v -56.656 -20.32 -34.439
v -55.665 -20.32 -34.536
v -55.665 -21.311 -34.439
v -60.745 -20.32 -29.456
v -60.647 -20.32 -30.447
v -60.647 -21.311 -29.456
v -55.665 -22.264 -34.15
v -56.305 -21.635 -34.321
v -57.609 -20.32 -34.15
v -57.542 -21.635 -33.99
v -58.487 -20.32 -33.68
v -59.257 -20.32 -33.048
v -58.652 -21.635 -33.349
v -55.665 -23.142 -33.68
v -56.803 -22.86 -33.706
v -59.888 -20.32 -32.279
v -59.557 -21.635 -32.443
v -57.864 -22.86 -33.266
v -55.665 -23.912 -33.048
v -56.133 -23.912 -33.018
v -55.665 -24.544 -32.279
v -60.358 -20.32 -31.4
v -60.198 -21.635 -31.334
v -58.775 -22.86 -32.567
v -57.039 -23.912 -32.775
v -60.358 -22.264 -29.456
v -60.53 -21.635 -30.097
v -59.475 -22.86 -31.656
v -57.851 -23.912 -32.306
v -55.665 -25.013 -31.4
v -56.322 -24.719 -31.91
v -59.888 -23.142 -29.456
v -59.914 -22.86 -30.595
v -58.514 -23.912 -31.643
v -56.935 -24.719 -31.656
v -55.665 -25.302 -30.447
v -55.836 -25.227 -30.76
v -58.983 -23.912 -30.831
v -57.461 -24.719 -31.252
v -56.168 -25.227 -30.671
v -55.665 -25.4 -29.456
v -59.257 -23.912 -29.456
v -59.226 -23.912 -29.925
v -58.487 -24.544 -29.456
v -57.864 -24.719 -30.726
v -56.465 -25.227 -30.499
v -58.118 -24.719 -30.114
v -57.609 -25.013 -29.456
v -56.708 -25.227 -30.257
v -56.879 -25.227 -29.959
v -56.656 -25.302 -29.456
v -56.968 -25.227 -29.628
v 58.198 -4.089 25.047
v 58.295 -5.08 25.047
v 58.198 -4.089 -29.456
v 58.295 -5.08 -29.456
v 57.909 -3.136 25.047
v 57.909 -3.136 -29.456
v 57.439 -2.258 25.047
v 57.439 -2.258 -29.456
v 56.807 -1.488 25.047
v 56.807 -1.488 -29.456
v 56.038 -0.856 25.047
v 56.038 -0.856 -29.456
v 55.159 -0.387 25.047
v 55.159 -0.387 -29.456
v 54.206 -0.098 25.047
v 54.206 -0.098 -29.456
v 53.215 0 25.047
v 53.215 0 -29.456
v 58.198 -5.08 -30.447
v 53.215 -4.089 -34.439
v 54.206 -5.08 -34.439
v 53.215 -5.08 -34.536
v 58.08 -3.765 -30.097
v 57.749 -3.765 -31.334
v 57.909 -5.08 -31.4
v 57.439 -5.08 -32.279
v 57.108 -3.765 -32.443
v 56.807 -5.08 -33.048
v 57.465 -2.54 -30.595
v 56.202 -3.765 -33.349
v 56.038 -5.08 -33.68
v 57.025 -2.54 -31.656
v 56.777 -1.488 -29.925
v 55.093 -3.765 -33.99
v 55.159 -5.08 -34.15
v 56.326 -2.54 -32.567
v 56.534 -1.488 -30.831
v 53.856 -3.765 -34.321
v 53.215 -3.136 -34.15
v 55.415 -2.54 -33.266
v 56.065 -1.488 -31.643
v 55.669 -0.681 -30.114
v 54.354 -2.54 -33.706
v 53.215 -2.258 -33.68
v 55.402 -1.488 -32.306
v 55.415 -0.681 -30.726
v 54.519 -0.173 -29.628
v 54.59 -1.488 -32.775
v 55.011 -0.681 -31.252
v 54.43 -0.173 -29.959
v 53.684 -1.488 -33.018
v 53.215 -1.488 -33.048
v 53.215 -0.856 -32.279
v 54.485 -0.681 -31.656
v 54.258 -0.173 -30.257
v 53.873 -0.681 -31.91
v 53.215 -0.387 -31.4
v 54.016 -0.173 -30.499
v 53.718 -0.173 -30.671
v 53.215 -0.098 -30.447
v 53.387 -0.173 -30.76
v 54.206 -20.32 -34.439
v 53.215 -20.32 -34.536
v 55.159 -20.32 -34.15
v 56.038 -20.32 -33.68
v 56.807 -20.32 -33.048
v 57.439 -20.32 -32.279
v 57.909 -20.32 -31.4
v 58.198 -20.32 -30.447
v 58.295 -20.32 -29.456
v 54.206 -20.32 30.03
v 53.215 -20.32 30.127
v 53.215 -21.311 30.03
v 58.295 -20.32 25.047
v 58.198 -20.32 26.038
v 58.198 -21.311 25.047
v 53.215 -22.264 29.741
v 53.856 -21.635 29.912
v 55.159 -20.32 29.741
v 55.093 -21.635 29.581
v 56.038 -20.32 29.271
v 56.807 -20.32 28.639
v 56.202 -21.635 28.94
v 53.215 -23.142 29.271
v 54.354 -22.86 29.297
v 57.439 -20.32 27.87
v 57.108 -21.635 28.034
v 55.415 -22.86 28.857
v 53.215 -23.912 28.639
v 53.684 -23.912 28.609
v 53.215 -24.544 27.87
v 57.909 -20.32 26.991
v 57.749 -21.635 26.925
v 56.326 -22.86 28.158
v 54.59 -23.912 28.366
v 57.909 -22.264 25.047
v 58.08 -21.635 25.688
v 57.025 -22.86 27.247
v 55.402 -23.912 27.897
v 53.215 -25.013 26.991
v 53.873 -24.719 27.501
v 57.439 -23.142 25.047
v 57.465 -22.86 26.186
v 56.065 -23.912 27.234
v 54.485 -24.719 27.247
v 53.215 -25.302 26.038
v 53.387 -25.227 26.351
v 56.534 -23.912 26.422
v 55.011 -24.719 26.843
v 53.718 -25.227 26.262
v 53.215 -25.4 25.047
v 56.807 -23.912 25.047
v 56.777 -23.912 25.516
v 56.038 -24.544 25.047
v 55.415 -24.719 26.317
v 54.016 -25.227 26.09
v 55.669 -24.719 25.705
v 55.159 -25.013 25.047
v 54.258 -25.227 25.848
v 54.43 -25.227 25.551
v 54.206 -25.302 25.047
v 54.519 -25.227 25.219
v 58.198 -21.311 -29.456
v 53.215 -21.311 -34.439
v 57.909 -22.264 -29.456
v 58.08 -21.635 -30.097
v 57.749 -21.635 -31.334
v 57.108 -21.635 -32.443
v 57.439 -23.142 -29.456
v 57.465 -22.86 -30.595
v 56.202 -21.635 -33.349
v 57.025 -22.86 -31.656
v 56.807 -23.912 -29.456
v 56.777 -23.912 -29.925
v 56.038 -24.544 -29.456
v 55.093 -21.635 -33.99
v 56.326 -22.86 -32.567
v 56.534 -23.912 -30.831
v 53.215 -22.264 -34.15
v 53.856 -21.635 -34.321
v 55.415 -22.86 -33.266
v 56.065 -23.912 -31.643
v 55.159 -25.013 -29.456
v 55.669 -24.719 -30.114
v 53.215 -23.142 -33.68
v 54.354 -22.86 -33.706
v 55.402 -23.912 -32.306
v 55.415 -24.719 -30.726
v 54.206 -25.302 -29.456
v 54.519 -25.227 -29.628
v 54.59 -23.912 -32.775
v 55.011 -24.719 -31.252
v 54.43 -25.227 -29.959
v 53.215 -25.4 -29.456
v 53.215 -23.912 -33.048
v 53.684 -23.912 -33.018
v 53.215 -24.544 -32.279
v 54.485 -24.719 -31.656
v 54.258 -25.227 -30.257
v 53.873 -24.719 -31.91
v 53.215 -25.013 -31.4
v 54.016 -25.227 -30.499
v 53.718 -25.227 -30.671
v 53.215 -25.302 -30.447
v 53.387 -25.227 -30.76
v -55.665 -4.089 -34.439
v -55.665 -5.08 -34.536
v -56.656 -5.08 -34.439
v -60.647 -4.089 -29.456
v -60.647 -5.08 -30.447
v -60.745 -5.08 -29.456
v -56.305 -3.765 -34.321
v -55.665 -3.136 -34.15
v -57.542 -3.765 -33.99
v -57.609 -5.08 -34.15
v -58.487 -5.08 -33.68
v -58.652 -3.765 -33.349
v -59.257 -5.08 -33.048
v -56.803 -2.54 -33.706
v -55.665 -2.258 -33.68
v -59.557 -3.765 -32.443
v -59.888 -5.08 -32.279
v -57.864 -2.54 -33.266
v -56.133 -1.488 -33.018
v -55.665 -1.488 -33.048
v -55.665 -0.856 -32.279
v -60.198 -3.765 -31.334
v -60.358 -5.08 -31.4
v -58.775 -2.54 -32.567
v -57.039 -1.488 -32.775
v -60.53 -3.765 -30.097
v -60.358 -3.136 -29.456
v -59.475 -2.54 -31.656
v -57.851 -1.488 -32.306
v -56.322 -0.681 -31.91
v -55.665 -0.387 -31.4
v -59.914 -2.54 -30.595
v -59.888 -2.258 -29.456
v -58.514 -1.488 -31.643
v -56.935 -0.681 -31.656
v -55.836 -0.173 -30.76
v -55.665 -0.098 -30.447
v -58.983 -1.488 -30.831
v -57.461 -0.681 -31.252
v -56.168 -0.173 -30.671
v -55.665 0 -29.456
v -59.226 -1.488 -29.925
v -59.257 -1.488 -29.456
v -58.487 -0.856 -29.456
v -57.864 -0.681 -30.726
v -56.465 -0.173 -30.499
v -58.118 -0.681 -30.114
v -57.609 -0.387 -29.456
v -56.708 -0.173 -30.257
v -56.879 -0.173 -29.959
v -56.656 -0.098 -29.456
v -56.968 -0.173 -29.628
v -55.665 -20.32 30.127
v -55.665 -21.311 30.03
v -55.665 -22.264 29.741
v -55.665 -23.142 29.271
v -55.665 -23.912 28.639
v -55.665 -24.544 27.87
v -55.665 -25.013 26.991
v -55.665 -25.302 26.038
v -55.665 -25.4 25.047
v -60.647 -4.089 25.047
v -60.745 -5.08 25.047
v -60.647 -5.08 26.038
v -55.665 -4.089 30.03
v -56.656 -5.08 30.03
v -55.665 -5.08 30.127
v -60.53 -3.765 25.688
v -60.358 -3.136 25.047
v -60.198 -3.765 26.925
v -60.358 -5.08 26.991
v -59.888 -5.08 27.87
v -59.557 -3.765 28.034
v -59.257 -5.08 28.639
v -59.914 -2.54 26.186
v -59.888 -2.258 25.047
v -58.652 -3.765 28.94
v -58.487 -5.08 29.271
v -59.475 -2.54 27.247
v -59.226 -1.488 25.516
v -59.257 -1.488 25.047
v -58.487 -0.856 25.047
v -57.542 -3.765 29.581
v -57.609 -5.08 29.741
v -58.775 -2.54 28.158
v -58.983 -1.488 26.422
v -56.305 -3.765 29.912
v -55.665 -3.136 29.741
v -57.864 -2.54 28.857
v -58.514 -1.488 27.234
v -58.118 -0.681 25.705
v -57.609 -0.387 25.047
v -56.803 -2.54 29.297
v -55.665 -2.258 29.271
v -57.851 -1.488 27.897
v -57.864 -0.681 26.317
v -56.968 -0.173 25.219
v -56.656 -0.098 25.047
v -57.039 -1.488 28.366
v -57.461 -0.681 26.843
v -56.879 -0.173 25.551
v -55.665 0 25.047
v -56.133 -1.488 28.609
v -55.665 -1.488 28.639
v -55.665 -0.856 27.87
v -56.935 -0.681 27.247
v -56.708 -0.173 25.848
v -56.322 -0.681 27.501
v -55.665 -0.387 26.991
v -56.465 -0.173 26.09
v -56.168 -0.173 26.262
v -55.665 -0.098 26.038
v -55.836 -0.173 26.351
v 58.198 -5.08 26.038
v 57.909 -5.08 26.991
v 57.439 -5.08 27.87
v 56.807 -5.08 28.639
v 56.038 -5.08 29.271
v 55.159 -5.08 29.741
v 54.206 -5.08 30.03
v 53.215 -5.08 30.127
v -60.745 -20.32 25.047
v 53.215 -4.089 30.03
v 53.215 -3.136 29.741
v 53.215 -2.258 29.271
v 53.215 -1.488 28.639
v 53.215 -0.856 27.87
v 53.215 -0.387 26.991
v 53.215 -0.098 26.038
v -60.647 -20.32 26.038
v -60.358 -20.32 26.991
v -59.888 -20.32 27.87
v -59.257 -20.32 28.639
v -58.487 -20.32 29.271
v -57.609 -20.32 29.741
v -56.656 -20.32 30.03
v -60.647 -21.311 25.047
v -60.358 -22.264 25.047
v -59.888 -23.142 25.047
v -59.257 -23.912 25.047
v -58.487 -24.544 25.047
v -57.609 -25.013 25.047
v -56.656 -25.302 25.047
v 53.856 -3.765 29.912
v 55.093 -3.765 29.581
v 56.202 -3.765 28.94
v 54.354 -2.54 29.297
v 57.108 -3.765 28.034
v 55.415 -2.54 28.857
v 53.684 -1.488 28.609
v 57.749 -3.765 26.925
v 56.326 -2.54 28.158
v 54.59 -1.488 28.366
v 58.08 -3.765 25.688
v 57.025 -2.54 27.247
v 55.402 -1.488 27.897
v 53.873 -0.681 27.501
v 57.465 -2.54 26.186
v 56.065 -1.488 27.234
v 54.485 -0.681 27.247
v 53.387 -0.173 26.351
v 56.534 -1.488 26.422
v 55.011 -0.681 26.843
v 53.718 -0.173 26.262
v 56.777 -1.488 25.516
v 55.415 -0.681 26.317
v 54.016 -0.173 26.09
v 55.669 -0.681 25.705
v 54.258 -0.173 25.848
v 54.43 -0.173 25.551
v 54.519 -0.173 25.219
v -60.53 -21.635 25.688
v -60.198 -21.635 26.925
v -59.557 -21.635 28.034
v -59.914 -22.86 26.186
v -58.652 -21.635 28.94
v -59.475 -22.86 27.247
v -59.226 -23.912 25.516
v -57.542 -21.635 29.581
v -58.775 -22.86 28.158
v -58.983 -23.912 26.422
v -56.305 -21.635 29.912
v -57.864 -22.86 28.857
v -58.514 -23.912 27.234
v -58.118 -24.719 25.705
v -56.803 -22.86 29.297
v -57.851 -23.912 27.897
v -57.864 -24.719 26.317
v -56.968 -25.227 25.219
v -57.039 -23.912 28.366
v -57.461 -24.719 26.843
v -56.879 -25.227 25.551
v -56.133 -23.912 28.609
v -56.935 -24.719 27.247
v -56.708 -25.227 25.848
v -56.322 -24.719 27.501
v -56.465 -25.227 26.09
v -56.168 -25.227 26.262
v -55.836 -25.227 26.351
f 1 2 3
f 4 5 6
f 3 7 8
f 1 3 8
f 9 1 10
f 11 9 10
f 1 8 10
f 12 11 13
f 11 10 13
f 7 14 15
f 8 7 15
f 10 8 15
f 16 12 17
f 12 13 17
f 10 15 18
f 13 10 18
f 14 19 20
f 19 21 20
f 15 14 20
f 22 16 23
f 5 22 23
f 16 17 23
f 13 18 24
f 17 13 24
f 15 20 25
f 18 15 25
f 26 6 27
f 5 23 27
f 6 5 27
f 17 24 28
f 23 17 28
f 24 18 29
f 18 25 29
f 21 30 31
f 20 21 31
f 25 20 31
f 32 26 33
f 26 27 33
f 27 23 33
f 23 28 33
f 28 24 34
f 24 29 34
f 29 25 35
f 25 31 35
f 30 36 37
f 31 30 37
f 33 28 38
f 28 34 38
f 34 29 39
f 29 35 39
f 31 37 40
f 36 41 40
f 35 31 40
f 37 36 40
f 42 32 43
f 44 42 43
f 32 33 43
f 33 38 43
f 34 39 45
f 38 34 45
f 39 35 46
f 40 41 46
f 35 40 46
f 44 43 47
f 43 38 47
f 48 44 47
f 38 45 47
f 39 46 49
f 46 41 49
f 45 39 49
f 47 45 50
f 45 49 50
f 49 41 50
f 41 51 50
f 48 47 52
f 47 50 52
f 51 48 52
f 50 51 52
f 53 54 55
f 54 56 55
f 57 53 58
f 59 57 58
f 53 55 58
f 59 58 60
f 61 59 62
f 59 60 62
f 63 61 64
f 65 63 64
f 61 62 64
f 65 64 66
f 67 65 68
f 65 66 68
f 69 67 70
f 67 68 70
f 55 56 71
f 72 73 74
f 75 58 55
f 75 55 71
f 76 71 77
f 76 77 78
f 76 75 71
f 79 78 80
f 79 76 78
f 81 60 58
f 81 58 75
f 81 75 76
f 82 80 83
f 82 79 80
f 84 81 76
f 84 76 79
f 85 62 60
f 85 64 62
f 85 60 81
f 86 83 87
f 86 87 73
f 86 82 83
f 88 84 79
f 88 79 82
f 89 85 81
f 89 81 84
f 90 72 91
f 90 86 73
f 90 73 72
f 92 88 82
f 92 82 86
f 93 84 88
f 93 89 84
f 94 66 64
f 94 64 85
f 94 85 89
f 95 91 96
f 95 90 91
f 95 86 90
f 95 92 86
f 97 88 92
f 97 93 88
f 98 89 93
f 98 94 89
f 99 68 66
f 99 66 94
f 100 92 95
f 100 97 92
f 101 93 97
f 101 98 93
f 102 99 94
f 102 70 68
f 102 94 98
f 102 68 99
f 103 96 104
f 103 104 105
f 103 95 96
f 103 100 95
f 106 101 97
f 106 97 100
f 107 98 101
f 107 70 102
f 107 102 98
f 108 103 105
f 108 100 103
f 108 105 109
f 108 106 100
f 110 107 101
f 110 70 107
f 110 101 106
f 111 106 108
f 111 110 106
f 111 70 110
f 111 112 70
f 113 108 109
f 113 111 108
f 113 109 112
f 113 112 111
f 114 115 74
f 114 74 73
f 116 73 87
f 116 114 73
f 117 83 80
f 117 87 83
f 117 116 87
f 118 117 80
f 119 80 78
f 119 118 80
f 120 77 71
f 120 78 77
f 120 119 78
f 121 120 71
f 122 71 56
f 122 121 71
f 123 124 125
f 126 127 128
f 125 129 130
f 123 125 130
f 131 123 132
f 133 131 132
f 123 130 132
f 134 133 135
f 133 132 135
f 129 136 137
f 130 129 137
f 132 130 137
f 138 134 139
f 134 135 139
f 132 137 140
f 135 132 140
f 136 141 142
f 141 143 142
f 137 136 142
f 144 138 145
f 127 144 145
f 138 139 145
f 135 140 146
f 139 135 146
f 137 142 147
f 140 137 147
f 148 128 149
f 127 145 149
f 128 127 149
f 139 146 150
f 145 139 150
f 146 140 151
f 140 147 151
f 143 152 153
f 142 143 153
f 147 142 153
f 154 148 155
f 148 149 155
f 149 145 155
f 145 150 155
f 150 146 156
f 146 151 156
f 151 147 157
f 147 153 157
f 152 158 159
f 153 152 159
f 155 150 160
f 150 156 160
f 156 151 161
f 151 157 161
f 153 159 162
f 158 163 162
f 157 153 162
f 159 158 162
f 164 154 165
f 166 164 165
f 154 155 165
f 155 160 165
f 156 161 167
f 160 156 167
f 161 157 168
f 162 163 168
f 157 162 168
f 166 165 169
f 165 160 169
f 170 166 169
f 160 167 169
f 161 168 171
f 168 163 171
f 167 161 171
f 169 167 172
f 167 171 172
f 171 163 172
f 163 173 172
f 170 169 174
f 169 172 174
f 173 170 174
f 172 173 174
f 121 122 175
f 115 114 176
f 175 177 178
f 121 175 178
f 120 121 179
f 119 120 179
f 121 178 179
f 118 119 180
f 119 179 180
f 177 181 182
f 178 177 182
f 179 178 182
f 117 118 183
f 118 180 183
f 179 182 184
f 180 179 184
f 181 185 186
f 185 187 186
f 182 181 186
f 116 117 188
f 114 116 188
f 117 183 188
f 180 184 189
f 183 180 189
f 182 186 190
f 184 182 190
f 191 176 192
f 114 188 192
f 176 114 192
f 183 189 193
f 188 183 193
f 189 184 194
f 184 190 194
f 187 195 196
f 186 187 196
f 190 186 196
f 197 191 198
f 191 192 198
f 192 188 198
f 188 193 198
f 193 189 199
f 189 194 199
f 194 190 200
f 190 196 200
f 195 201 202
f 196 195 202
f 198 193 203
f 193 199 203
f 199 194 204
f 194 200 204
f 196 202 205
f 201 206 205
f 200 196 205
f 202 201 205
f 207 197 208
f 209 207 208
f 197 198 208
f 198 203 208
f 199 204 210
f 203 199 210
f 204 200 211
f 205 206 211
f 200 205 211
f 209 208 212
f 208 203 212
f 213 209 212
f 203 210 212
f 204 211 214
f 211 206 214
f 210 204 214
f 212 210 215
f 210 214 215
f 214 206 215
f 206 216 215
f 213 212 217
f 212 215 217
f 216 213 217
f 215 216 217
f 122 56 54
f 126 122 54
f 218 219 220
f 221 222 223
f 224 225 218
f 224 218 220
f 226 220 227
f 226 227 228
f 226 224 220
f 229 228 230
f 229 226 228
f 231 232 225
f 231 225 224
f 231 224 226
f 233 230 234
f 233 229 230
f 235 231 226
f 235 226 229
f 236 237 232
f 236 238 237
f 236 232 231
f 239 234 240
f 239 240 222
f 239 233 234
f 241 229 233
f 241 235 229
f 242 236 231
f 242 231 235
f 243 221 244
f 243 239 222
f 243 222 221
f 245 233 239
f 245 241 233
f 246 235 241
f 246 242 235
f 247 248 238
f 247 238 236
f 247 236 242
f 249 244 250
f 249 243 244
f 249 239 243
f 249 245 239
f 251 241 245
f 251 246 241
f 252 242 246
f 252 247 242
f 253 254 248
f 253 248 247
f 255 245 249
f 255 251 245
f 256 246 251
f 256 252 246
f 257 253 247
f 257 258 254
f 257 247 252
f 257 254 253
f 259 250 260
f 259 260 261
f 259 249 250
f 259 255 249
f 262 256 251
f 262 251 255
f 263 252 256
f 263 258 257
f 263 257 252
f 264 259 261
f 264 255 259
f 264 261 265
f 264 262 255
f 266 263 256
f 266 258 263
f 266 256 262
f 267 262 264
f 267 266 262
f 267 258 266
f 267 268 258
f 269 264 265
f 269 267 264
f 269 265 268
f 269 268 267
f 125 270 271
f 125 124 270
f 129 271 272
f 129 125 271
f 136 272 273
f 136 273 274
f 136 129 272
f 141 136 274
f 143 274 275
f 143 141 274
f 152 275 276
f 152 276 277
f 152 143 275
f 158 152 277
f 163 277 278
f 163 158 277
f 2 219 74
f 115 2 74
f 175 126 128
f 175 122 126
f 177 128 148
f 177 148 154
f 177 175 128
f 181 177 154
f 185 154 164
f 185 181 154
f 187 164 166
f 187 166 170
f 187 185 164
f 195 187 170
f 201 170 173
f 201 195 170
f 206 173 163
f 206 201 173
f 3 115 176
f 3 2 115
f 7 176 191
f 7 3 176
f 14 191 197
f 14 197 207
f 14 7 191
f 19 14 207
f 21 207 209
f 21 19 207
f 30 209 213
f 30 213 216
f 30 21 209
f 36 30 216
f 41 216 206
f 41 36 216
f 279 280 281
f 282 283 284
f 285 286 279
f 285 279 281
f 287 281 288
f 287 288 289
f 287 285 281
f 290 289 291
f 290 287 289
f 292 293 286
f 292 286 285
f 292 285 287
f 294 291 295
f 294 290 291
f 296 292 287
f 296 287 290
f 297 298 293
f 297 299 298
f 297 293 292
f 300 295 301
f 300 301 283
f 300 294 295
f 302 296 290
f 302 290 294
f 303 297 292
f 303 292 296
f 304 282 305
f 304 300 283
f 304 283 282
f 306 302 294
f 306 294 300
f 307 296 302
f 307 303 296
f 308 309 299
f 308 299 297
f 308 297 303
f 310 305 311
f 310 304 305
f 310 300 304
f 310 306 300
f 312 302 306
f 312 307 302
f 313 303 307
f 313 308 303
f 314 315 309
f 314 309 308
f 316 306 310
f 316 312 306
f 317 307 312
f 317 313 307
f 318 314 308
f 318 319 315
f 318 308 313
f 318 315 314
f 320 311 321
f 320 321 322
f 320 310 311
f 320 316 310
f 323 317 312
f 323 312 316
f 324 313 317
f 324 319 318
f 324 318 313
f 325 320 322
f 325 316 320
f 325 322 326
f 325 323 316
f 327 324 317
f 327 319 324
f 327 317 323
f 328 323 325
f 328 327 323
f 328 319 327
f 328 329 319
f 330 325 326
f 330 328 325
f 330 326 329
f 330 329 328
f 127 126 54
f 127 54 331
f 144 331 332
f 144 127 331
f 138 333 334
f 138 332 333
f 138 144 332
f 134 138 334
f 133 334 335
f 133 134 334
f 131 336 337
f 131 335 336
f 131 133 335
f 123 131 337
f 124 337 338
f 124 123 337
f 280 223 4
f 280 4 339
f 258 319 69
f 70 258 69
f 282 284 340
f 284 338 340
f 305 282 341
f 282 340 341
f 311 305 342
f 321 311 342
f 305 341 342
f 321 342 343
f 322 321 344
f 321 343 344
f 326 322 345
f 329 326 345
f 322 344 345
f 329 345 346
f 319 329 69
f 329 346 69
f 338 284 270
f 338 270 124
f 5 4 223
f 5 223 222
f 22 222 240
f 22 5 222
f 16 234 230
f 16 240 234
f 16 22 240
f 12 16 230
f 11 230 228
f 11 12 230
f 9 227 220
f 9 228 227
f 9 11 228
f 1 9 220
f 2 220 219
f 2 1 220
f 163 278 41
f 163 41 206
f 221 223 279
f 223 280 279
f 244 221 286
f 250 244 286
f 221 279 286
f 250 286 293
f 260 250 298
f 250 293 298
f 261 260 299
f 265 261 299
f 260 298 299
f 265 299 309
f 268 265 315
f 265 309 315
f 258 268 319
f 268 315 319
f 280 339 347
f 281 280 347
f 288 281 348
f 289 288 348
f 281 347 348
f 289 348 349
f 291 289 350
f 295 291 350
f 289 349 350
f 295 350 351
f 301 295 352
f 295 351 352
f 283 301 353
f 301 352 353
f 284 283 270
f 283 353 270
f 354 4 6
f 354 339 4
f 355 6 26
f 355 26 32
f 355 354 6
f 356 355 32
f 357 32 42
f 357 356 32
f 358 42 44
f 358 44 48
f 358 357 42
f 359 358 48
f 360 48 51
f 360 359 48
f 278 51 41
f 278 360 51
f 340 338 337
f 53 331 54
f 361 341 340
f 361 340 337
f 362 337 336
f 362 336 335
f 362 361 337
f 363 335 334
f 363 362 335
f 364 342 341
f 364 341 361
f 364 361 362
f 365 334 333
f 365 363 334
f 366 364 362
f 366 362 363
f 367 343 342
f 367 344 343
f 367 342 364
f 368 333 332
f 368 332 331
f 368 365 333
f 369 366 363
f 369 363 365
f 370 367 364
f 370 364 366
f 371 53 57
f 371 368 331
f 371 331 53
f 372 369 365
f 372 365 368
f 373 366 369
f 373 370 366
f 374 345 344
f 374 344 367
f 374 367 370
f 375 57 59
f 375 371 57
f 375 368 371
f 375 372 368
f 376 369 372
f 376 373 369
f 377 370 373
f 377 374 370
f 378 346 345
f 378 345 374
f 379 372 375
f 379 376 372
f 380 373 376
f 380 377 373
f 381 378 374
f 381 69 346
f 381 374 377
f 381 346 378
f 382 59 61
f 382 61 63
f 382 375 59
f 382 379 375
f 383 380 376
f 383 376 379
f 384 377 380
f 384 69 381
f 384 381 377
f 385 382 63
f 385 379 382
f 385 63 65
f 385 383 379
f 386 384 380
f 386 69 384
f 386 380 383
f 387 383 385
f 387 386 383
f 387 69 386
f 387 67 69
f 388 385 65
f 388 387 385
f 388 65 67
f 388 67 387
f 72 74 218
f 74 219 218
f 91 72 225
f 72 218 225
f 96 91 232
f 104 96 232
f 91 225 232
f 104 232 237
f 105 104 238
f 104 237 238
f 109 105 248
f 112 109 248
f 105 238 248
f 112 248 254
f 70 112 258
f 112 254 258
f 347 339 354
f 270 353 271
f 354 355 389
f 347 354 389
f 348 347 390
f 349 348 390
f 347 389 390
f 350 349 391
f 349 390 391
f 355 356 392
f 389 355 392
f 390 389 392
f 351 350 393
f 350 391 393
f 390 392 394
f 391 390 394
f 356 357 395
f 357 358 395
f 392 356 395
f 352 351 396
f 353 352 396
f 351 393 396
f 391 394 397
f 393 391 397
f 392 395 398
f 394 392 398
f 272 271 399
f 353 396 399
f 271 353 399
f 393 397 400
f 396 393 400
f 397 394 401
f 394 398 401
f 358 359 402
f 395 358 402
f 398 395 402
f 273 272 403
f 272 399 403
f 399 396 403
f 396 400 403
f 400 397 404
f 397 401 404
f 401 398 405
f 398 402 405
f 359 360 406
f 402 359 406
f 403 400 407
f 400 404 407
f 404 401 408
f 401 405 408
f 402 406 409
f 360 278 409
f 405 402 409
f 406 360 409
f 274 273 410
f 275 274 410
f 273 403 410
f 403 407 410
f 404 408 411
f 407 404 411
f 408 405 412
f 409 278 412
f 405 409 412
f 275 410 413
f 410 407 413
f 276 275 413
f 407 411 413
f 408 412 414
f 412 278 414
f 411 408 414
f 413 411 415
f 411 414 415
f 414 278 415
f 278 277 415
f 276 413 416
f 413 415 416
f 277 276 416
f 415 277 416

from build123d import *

# Parameters (mm, degrees)
F0_W     = 119.039789
F0_H     = 64.663587
F1_DEPTH = 25.4
F2_R     = 5.08
F3_R     = 5.08


with BuildPart() as f1:
    # F0 (on Front) → F1 (new body)
    with BuildSketch(Plane.XZ):
        with Locations((-1.224685, -2.204438)):
            Rectangle(F0_W, F0_H)
    extrude(amount=F1_DEPTH)

    # F2
    f2_edges = [f1.edges().sort_by_distance(p)[0] for p in [
        (58.295209, -12.7, 30.127356),
        (58.295209, -12.7, -34.536231),
        (-60.74458, -12.7, 30.127356),
        (-60.74458, -12.7, -34.536231),
    ]]
    fillet(f2_edges, radius=F2_R)

    # F3
    f3_edges = [f1.edges().sort_by_distance(p)[0] for p in [
        (-60.74458, -25.4, -2.204438),
        (-60.74458, 0, -2.204438),
    ]]
    fillet(f3_edges, radius=F3_R)


solid = f1.part
